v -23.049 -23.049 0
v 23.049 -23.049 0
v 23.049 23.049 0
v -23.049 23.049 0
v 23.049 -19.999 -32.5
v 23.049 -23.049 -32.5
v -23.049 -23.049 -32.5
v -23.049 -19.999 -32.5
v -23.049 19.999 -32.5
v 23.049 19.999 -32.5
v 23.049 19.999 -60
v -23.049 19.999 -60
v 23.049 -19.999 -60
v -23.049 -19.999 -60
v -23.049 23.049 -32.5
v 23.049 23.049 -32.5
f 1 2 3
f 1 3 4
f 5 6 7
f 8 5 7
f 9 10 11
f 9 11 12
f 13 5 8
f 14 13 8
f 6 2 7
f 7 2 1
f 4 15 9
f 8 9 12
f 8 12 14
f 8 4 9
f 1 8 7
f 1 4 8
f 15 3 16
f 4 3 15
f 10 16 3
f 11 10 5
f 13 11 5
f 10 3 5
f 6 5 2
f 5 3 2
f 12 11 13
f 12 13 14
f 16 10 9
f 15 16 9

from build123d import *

# Parameters (mm, degrees)
SKETCH1_W           = 46.097722286
SKETCH1_H           = 46.097722286
BOSS_EXTRUDE1_DEPTH = 32.5
SKETCH2_W           = 46.097722286
SKETCH2_H           = 39.997722286
BOSS_EXTRUDE2_DEPTH = 27.5


with BuildPart() as part:
    # Sketch1 → Boss-Extrude1 (new body)
    with BuildSketch(Plane(origin=(0, 0, 0), x_dir=(-1, 0, 0), z_dir=(0, 0, 1))):
        Rectangle(SKETCH1_W, SKETCH1_H)
    extrude(amount=-BOSS_EXTRUDE1_DEPTH)

    # Sketch2 → Boss-Extrude2 (add)
    with BuildSketch(Plane(origin=(0, 0, -32.5), x_dir=(-1, 0, 0), z_dir=(0, 0, -1))):
        Rectangle(SKETCH2_W, SKETCH2_H)
    extrude(amount=BOSS_EXTRUDE2_DEPTH)


solid = part.part
